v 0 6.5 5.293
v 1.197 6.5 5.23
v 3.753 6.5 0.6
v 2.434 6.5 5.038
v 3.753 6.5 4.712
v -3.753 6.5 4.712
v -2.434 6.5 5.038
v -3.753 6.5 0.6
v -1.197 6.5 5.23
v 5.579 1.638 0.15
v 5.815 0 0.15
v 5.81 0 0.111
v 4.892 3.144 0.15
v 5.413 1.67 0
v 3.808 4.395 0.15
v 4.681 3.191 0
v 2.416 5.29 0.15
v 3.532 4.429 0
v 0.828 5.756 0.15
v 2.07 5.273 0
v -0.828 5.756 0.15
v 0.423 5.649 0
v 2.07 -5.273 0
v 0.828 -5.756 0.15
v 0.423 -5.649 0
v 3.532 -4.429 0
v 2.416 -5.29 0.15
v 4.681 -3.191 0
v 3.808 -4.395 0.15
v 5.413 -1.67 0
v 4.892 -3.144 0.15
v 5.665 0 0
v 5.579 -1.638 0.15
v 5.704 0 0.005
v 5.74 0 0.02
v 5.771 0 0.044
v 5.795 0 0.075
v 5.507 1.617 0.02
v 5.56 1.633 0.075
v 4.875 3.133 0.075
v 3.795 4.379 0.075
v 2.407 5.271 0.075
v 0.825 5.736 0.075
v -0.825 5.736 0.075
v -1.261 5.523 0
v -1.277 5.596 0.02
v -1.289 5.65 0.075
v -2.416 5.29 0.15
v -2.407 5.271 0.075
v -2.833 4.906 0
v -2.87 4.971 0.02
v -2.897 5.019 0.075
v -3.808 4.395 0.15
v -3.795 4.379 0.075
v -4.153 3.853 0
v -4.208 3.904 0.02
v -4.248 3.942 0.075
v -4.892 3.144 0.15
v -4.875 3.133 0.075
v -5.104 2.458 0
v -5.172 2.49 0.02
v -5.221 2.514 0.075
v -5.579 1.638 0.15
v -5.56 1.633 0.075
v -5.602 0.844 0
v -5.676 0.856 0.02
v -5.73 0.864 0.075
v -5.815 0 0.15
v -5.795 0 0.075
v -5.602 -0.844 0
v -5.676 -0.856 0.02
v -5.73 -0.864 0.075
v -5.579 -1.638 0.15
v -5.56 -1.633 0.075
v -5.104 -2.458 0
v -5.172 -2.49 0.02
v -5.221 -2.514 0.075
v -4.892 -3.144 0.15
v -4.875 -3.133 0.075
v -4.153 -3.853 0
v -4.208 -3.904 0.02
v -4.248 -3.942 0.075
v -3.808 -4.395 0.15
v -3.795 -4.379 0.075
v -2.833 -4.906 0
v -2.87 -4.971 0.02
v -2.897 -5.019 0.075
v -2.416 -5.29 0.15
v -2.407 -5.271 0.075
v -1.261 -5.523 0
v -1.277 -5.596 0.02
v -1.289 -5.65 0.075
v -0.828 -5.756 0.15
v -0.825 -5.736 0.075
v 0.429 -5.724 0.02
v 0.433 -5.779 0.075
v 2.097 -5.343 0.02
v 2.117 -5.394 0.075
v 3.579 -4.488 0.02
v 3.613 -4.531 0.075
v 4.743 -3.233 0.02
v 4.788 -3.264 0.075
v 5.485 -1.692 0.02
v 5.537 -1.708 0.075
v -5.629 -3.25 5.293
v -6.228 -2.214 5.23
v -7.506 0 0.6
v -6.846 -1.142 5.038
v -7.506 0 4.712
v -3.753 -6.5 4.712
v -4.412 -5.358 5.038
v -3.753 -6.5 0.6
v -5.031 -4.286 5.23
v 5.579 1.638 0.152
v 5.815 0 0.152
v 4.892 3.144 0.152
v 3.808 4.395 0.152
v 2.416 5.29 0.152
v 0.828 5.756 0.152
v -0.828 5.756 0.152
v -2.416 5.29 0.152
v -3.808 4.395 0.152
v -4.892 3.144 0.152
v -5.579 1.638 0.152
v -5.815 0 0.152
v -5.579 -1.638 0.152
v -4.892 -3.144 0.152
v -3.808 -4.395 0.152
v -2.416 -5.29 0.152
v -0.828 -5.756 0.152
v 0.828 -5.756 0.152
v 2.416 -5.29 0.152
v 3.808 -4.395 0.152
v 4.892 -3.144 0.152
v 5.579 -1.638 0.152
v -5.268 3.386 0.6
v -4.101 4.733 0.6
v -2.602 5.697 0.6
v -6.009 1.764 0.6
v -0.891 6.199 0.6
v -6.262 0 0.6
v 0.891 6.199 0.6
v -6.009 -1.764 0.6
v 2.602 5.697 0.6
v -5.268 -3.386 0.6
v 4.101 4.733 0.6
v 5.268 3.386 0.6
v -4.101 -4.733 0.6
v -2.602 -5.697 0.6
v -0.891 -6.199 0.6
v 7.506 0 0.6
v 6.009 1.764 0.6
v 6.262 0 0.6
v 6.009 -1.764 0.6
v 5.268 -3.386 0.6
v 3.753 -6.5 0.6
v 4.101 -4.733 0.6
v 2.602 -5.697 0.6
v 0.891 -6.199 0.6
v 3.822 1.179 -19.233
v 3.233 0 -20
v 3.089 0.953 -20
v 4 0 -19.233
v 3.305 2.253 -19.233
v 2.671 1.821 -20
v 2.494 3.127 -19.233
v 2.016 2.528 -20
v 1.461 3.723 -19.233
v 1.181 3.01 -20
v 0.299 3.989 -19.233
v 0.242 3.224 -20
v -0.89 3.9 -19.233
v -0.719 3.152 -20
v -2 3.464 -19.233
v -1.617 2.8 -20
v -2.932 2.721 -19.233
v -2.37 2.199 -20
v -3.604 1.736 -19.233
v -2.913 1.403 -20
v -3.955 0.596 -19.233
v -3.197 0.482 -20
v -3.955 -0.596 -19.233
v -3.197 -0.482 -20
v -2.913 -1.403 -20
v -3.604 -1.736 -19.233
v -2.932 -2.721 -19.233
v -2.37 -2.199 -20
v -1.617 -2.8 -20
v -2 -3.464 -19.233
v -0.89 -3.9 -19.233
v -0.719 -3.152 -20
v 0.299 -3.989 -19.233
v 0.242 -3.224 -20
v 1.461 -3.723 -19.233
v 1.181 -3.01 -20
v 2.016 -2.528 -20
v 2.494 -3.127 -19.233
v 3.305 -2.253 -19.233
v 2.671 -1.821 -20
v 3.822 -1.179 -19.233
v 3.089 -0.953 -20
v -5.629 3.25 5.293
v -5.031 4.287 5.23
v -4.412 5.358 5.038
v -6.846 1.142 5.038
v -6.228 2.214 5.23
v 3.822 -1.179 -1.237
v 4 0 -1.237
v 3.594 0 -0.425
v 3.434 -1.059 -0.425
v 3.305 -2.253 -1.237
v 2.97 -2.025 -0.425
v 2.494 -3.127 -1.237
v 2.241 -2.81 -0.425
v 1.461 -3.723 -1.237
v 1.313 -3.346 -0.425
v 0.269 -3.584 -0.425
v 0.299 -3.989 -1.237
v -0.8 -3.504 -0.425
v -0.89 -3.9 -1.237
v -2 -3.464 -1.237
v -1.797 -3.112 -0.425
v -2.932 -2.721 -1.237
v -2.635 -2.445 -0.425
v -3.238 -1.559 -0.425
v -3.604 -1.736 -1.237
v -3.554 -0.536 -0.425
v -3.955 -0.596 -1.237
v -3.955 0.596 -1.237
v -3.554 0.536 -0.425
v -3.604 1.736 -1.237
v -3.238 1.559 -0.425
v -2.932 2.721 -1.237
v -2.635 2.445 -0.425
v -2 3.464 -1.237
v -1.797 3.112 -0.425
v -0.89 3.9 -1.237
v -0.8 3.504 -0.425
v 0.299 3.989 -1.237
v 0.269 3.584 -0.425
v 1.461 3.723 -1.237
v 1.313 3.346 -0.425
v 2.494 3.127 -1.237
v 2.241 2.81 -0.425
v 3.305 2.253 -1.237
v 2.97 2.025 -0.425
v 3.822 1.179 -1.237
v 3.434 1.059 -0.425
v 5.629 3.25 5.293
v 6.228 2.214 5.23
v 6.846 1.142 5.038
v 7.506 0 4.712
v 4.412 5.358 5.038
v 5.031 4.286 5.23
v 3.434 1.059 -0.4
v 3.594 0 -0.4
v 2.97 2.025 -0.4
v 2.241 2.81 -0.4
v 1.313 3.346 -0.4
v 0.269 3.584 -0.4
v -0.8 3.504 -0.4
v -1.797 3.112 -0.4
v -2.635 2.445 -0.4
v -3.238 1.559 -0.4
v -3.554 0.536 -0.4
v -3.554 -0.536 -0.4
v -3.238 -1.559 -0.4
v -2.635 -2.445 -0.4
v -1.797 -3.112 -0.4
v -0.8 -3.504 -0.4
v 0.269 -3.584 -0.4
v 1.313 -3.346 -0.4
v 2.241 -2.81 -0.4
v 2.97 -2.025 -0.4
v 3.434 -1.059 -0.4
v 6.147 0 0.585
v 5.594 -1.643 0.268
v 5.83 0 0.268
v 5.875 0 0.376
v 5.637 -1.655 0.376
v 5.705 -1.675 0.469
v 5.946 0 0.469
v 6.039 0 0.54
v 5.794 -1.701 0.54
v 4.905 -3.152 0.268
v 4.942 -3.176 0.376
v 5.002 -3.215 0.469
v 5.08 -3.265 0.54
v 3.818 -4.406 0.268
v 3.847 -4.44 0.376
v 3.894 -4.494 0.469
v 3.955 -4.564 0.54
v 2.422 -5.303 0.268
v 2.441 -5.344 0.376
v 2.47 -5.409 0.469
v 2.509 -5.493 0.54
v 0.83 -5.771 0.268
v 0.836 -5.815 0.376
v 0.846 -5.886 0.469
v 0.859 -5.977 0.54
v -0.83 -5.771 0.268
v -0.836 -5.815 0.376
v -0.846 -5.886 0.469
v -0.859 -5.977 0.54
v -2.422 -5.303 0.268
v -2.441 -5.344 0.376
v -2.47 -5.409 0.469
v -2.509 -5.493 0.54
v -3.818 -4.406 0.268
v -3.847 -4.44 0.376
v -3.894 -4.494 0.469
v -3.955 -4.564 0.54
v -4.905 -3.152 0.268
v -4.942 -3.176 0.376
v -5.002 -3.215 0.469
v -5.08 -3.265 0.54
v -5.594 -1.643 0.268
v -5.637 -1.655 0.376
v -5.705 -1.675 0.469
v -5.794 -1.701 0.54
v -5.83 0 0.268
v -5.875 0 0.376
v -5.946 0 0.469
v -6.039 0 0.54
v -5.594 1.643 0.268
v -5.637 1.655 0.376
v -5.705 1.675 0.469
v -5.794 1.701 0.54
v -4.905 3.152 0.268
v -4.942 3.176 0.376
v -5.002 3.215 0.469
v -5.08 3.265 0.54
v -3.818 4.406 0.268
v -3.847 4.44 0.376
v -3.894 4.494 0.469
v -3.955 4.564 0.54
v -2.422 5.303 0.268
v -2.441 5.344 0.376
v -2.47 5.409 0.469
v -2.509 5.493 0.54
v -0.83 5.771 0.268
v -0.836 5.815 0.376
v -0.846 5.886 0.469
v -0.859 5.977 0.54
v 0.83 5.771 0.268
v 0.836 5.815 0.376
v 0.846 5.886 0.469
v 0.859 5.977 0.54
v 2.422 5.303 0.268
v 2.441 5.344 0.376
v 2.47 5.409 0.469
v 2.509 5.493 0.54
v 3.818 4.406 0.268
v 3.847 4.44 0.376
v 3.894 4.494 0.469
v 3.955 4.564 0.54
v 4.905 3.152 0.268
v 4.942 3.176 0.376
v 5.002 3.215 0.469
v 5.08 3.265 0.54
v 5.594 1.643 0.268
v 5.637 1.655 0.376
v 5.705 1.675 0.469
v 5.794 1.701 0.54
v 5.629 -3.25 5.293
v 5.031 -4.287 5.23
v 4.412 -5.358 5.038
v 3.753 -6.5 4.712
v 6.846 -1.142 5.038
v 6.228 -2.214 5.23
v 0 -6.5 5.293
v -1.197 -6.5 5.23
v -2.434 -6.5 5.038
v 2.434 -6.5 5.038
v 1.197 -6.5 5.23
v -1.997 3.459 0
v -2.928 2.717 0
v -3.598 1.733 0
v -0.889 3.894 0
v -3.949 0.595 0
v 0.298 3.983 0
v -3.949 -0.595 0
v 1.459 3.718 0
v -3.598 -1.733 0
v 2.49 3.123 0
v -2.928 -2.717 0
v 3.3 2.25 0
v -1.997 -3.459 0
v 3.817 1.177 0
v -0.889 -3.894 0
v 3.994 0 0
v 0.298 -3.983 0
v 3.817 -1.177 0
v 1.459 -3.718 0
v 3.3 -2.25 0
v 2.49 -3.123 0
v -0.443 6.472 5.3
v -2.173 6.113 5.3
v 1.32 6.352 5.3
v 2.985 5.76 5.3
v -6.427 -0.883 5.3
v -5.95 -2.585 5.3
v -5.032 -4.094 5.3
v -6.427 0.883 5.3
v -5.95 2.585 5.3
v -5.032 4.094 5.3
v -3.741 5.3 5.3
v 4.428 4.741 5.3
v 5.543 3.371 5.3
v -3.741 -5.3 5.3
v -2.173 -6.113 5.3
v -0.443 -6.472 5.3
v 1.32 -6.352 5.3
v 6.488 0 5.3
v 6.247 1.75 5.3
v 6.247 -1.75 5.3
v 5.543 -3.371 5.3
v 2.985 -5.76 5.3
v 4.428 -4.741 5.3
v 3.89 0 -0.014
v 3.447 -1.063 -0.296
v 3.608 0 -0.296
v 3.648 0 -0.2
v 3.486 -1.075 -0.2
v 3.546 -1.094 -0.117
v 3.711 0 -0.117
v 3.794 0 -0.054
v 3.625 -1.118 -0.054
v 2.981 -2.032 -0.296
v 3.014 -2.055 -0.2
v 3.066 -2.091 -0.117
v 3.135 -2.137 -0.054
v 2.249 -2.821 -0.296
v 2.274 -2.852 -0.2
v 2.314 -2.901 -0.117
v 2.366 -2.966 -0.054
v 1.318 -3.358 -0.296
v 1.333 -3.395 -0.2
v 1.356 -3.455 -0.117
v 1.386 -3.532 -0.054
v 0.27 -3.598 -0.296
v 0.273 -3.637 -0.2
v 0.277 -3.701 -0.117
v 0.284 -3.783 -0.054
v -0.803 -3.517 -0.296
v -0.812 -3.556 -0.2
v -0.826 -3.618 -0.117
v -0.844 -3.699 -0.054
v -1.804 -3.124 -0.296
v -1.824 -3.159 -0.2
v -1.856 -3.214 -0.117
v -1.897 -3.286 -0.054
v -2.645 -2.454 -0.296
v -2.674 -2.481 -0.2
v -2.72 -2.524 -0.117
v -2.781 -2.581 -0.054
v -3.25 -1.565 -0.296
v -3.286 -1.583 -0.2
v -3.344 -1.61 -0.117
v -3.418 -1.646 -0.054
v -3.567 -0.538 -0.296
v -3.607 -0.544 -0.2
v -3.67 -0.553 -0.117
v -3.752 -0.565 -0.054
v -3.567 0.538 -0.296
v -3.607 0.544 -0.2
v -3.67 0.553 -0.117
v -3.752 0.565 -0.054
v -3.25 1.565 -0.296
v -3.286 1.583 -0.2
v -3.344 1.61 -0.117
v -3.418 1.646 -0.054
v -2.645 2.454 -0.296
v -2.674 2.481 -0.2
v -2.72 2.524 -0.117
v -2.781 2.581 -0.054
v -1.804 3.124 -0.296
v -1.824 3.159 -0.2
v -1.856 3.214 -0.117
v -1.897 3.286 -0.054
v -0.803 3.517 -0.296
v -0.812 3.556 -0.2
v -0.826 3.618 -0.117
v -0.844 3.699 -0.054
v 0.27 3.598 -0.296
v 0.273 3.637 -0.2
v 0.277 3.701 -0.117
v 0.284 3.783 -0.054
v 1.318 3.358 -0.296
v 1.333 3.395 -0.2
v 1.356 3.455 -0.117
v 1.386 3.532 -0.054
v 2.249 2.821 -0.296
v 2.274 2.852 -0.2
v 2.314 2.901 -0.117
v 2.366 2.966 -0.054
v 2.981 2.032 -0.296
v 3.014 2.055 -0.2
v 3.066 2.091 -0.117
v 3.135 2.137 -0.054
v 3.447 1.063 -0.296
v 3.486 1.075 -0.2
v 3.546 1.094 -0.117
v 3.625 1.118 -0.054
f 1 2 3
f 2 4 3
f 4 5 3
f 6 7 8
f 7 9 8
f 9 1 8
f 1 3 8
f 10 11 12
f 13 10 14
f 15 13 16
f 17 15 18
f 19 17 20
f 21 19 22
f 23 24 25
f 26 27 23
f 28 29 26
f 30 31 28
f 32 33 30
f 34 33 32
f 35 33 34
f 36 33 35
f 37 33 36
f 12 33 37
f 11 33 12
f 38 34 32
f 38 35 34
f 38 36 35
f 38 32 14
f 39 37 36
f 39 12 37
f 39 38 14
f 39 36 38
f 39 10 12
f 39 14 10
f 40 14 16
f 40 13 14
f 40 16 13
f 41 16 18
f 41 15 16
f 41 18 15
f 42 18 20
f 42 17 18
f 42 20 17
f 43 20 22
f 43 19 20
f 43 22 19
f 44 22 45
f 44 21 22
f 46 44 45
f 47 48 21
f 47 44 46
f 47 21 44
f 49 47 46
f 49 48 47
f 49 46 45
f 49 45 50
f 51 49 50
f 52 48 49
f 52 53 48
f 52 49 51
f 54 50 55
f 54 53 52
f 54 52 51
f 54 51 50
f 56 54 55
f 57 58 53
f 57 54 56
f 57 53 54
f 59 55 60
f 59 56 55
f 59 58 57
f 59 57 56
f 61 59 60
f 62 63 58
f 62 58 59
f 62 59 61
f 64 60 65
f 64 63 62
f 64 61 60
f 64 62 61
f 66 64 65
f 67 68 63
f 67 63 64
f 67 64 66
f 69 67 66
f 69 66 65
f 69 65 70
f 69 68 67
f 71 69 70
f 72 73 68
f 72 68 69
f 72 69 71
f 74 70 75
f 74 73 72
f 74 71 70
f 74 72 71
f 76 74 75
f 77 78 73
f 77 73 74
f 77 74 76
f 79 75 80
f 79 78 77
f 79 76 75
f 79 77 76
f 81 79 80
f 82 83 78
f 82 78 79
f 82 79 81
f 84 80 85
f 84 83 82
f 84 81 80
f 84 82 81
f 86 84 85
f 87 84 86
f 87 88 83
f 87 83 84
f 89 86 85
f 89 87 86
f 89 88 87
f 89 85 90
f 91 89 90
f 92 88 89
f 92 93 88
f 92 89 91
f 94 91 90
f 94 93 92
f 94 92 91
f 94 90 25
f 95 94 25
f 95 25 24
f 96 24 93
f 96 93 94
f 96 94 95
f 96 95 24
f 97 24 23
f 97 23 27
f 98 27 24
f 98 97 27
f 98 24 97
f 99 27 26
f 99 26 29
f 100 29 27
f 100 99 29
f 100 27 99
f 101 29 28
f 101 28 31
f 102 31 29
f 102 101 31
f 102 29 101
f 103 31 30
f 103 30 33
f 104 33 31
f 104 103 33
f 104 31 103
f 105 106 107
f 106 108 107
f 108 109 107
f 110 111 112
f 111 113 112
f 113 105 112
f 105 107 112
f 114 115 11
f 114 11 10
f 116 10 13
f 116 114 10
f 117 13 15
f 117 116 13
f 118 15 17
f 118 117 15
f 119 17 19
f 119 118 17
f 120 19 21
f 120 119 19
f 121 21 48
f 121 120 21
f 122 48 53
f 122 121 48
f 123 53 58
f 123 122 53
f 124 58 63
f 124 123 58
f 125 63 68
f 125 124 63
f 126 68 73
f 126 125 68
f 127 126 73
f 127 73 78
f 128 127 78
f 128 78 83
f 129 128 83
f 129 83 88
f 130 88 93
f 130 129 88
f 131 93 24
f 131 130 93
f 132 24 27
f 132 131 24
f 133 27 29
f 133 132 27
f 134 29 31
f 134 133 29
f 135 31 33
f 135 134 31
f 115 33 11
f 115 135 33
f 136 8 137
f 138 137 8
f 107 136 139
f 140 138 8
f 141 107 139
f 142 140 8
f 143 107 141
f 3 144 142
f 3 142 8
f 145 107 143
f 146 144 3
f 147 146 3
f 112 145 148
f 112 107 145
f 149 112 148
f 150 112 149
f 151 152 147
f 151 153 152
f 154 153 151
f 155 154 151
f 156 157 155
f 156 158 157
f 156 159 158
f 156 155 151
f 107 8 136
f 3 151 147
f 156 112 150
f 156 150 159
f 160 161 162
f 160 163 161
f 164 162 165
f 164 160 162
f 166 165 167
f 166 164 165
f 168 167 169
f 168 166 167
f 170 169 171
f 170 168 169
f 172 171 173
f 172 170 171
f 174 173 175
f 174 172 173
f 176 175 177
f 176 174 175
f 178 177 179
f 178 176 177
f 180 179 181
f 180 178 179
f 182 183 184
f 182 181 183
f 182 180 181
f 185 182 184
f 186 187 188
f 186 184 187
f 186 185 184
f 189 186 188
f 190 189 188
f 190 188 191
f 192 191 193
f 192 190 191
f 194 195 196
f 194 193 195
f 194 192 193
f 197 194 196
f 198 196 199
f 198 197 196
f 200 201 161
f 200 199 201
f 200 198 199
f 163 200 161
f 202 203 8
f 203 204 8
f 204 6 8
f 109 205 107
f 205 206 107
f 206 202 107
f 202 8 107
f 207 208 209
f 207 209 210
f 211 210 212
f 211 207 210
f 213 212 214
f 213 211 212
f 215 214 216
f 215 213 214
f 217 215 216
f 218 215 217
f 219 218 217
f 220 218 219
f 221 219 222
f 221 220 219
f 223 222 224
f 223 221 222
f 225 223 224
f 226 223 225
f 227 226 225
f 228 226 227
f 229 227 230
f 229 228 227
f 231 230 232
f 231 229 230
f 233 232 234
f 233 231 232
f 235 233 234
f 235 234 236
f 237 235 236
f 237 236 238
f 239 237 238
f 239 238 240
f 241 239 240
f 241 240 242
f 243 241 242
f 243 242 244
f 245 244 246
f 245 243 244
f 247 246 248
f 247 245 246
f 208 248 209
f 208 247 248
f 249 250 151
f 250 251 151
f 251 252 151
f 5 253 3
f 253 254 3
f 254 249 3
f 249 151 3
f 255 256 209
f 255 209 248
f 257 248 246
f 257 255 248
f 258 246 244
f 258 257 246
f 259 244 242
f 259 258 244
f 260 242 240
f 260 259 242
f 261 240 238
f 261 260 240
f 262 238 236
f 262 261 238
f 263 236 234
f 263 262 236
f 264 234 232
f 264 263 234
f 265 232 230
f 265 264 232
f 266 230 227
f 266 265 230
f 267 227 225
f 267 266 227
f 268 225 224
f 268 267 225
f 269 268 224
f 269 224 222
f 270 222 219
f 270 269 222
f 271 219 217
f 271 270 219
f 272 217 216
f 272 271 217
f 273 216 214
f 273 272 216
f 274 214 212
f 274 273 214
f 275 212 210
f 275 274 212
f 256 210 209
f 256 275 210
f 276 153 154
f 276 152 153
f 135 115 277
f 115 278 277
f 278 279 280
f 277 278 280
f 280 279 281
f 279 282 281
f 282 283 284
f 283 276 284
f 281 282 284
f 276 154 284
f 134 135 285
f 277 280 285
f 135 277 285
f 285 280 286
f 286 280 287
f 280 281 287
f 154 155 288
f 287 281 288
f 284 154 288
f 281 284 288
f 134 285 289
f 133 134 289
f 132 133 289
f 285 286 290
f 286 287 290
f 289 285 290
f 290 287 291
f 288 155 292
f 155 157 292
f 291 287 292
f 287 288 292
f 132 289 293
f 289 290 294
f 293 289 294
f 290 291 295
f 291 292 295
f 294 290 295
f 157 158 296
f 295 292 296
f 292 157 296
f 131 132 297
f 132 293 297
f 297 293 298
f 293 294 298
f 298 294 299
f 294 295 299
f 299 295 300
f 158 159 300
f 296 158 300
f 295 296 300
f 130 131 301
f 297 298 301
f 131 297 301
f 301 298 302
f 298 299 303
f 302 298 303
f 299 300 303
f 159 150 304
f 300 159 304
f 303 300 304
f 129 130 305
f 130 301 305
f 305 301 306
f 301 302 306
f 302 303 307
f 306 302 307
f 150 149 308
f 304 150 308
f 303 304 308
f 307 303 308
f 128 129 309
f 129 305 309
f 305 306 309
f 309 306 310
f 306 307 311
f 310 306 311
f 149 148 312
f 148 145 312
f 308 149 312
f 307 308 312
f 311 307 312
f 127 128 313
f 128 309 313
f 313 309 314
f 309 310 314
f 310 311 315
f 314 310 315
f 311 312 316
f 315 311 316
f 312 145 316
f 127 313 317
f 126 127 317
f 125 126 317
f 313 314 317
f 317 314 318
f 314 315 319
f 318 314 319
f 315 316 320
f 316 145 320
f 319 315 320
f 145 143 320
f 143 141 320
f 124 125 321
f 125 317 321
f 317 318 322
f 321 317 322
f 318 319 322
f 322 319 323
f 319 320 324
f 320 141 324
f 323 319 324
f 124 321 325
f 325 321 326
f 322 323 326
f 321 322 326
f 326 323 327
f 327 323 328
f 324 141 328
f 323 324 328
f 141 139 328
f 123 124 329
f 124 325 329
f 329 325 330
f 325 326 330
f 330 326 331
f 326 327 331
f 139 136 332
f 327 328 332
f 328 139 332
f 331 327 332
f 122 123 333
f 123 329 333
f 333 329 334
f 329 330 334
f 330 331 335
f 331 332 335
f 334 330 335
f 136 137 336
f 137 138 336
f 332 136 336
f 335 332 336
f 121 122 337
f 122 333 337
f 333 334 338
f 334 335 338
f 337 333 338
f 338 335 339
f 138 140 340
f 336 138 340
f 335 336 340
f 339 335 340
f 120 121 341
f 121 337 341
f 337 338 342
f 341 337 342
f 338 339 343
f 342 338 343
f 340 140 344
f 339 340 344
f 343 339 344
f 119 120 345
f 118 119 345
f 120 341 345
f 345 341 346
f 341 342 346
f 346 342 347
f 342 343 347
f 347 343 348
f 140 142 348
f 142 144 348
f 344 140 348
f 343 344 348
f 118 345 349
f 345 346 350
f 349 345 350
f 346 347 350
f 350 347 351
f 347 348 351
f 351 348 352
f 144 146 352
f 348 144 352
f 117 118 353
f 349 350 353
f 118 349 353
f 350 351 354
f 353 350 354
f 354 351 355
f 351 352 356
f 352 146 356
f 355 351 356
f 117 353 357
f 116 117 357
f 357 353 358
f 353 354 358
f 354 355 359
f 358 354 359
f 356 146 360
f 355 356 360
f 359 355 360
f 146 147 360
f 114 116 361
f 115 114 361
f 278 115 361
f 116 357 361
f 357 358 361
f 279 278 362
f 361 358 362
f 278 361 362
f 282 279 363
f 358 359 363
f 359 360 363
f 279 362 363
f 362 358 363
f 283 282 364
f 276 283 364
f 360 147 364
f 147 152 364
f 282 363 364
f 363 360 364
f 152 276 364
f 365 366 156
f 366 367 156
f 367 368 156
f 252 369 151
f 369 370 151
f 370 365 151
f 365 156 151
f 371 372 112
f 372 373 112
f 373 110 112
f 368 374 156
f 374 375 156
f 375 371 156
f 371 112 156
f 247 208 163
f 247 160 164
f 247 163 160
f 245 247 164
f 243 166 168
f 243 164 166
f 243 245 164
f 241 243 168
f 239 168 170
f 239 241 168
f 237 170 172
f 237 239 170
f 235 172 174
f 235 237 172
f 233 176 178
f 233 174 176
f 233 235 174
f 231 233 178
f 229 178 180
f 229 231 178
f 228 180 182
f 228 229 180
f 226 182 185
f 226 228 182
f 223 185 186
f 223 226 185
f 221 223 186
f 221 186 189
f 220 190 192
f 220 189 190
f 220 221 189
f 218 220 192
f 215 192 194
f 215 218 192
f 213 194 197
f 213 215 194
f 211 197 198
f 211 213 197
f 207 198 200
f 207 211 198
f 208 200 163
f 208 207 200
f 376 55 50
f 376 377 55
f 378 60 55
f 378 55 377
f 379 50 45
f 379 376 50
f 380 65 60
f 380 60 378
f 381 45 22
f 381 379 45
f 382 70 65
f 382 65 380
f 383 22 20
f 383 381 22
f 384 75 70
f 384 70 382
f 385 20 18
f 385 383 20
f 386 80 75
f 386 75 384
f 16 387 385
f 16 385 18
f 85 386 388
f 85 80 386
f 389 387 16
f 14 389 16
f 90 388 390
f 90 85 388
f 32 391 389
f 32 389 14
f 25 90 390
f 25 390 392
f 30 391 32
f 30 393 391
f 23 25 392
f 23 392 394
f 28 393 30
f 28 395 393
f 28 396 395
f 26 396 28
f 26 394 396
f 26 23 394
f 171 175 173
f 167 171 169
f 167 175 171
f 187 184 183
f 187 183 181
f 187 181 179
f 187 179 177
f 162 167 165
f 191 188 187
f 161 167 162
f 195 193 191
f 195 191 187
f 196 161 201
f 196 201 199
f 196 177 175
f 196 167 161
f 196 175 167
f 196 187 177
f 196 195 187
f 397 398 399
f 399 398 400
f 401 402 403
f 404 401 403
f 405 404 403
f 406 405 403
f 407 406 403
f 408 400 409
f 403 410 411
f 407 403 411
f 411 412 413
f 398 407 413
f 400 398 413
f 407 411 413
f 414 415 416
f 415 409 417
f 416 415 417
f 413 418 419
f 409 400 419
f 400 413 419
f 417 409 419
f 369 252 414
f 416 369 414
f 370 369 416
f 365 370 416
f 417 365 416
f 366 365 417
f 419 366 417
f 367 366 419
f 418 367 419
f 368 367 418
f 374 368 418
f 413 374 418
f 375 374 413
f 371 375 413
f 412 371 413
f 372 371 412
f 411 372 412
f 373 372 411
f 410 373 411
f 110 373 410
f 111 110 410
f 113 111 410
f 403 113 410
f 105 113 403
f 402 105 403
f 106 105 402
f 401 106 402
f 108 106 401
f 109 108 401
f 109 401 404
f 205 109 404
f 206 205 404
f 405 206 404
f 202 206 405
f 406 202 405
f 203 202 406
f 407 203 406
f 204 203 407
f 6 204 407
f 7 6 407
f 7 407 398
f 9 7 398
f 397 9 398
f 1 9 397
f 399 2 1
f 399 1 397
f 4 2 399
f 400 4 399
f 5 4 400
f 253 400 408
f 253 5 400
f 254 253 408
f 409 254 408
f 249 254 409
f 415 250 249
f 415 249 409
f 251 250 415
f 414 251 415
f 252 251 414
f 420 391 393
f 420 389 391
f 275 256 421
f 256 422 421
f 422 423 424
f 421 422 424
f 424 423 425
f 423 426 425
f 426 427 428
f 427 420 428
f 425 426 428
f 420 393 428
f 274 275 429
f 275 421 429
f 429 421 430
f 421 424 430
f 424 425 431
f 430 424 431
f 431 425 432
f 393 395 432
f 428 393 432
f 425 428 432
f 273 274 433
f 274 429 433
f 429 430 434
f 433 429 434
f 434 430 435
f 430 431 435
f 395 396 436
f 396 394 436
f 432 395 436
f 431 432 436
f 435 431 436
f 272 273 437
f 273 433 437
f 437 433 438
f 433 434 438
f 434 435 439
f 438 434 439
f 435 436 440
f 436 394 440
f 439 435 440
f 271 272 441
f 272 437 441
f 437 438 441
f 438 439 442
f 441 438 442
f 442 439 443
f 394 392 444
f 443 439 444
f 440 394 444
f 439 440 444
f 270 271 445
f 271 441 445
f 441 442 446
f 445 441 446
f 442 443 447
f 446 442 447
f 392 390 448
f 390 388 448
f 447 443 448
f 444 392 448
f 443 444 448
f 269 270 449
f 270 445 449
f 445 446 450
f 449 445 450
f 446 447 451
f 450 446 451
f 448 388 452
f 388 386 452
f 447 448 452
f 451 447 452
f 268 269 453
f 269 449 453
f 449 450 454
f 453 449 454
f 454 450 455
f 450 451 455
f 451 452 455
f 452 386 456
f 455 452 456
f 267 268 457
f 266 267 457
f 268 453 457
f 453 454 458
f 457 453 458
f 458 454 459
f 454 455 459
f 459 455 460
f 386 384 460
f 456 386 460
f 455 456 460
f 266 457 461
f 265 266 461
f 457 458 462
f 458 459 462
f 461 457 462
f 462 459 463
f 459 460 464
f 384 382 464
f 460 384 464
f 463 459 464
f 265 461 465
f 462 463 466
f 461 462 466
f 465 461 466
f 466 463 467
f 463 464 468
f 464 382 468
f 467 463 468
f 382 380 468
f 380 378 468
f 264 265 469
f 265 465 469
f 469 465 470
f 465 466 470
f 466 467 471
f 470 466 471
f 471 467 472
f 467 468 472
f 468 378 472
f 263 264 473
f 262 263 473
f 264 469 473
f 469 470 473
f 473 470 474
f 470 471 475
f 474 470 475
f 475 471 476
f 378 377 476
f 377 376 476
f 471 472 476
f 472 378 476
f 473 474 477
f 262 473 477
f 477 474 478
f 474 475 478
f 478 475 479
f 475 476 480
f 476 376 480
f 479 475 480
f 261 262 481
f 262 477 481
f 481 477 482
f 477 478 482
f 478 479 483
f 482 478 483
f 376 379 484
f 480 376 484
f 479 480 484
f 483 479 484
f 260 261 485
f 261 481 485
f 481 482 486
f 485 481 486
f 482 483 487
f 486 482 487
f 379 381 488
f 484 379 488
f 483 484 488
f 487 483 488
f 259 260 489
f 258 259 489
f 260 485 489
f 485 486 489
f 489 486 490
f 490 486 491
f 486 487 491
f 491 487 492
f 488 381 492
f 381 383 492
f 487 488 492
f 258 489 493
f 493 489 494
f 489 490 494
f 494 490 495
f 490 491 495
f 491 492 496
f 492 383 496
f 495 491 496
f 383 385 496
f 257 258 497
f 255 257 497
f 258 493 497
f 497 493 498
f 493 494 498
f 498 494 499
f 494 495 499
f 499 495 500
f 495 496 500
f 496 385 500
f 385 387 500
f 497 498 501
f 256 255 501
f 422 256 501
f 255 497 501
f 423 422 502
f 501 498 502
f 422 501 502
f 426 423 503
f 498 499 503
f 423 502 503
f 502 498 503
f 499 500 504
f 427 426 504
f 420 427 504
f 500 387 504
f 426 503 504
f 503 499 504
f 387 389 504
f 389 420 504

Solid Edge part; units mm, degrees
sketch "Sketch1" plane through (0, 0, 0) normal (0, -1, 0) x (1, 0, 0)
  line L0 (0, -20) -> (4, -20)
  line L1 (4, -20) -> (4, -1.237)
  line L2 (4, -1.237) -> (3.594, -0.425)
  line L3 (3.594, -0.425) -> (3.594, 0)
  line L4 (3.594, 0) -> (7.5056, 0)
  line L5 (7.5056, 0) -> (7.5056, 5.3)
  line L6 (7.5056, 5.3) -> (0, 5.3)
  dimension "D1" = 4
  dimension "D2" = 3.594
  dimension "D3" = 20
  dimension "D4" = 18.763
  dimension "D5" = 0.812
  dimension "D6" = 6.5
  dimension "D7" = 5.3
revolve "RevolvedProtrusion1" add sketch "Sketch1" angle 360 about axis through (0, 0, 6.4) along (0, 0, -1)
sketch "Sketch2" plane through (0, 0, 0) normal (0, 0, 1) x (1, 0, 0)
  line L0 (7.5056, 0) -> (3.7528, 6.5)
  arc A0 (3.7528, 6.5) -> (7.5056, 0) centre (0, 0) cw
  dimension "D1" = 6.5
extrude "ExtrudedCutout_1" cut sketch "Sketch2" along normal blind 5.3
pattern_circular "Pattern1" count 6 over 360 about axis through (0, 0, 5.3) along (0, 0, 1) of "ExtrudedCutout_1"
sketch "Sketch3" plane through (0, 0, 0) normal (0, -1, 0) x (1, 0, 0)
  line L0 (5.815, 0) -> (5.815, 0.6)
  line L1 (5.815, 0.6) -> (7.5056, 0.6)
  line L2 (7.5056, 0.6) -> (7.5056, 0)
  line L3 (7.5056, 0) -> (5.815, 0)
  line L4 (6.4875, 5.3) -> (7.5056, 5.3)
  line L5 (7.5056, 5.3) -> (7.5056, 4.7122)
  line L6 (7.5056, 4.7122) -> (6.4875, 5.3)
  dimension "D1" = 5.3
  dimension "D2" = 6.4875
  dimension "D3" = 7.5056
  dimension "D4" = 5.815
  dimension "D5" = 7.5056
  dimension "D6" = 0.6
revolve "RevolvedCutout_1" cut sketch "Sketch3" angle 360 about axis through (0, 0, 6.4) along (0, 0, -1)
cosmetic_thread "Thread_1" size "M8" thread depth 18.763
chamfer "Chamfer_1" distance 0.767 angle 45 1 edges at (-4, 0, -20) measured on face at (2.7467, 2.5867, -20)
fillet "Round_1" radius 0.4 1 edges at (-3.594, 0, 0)
fillet "Round_2" radius 0.15 1 edges at (-5.815, 0, 0)
fillet "Round_3" radius 0.4475 1 edges at (-5.815, 0, 0.6)
properties material "Steel"
